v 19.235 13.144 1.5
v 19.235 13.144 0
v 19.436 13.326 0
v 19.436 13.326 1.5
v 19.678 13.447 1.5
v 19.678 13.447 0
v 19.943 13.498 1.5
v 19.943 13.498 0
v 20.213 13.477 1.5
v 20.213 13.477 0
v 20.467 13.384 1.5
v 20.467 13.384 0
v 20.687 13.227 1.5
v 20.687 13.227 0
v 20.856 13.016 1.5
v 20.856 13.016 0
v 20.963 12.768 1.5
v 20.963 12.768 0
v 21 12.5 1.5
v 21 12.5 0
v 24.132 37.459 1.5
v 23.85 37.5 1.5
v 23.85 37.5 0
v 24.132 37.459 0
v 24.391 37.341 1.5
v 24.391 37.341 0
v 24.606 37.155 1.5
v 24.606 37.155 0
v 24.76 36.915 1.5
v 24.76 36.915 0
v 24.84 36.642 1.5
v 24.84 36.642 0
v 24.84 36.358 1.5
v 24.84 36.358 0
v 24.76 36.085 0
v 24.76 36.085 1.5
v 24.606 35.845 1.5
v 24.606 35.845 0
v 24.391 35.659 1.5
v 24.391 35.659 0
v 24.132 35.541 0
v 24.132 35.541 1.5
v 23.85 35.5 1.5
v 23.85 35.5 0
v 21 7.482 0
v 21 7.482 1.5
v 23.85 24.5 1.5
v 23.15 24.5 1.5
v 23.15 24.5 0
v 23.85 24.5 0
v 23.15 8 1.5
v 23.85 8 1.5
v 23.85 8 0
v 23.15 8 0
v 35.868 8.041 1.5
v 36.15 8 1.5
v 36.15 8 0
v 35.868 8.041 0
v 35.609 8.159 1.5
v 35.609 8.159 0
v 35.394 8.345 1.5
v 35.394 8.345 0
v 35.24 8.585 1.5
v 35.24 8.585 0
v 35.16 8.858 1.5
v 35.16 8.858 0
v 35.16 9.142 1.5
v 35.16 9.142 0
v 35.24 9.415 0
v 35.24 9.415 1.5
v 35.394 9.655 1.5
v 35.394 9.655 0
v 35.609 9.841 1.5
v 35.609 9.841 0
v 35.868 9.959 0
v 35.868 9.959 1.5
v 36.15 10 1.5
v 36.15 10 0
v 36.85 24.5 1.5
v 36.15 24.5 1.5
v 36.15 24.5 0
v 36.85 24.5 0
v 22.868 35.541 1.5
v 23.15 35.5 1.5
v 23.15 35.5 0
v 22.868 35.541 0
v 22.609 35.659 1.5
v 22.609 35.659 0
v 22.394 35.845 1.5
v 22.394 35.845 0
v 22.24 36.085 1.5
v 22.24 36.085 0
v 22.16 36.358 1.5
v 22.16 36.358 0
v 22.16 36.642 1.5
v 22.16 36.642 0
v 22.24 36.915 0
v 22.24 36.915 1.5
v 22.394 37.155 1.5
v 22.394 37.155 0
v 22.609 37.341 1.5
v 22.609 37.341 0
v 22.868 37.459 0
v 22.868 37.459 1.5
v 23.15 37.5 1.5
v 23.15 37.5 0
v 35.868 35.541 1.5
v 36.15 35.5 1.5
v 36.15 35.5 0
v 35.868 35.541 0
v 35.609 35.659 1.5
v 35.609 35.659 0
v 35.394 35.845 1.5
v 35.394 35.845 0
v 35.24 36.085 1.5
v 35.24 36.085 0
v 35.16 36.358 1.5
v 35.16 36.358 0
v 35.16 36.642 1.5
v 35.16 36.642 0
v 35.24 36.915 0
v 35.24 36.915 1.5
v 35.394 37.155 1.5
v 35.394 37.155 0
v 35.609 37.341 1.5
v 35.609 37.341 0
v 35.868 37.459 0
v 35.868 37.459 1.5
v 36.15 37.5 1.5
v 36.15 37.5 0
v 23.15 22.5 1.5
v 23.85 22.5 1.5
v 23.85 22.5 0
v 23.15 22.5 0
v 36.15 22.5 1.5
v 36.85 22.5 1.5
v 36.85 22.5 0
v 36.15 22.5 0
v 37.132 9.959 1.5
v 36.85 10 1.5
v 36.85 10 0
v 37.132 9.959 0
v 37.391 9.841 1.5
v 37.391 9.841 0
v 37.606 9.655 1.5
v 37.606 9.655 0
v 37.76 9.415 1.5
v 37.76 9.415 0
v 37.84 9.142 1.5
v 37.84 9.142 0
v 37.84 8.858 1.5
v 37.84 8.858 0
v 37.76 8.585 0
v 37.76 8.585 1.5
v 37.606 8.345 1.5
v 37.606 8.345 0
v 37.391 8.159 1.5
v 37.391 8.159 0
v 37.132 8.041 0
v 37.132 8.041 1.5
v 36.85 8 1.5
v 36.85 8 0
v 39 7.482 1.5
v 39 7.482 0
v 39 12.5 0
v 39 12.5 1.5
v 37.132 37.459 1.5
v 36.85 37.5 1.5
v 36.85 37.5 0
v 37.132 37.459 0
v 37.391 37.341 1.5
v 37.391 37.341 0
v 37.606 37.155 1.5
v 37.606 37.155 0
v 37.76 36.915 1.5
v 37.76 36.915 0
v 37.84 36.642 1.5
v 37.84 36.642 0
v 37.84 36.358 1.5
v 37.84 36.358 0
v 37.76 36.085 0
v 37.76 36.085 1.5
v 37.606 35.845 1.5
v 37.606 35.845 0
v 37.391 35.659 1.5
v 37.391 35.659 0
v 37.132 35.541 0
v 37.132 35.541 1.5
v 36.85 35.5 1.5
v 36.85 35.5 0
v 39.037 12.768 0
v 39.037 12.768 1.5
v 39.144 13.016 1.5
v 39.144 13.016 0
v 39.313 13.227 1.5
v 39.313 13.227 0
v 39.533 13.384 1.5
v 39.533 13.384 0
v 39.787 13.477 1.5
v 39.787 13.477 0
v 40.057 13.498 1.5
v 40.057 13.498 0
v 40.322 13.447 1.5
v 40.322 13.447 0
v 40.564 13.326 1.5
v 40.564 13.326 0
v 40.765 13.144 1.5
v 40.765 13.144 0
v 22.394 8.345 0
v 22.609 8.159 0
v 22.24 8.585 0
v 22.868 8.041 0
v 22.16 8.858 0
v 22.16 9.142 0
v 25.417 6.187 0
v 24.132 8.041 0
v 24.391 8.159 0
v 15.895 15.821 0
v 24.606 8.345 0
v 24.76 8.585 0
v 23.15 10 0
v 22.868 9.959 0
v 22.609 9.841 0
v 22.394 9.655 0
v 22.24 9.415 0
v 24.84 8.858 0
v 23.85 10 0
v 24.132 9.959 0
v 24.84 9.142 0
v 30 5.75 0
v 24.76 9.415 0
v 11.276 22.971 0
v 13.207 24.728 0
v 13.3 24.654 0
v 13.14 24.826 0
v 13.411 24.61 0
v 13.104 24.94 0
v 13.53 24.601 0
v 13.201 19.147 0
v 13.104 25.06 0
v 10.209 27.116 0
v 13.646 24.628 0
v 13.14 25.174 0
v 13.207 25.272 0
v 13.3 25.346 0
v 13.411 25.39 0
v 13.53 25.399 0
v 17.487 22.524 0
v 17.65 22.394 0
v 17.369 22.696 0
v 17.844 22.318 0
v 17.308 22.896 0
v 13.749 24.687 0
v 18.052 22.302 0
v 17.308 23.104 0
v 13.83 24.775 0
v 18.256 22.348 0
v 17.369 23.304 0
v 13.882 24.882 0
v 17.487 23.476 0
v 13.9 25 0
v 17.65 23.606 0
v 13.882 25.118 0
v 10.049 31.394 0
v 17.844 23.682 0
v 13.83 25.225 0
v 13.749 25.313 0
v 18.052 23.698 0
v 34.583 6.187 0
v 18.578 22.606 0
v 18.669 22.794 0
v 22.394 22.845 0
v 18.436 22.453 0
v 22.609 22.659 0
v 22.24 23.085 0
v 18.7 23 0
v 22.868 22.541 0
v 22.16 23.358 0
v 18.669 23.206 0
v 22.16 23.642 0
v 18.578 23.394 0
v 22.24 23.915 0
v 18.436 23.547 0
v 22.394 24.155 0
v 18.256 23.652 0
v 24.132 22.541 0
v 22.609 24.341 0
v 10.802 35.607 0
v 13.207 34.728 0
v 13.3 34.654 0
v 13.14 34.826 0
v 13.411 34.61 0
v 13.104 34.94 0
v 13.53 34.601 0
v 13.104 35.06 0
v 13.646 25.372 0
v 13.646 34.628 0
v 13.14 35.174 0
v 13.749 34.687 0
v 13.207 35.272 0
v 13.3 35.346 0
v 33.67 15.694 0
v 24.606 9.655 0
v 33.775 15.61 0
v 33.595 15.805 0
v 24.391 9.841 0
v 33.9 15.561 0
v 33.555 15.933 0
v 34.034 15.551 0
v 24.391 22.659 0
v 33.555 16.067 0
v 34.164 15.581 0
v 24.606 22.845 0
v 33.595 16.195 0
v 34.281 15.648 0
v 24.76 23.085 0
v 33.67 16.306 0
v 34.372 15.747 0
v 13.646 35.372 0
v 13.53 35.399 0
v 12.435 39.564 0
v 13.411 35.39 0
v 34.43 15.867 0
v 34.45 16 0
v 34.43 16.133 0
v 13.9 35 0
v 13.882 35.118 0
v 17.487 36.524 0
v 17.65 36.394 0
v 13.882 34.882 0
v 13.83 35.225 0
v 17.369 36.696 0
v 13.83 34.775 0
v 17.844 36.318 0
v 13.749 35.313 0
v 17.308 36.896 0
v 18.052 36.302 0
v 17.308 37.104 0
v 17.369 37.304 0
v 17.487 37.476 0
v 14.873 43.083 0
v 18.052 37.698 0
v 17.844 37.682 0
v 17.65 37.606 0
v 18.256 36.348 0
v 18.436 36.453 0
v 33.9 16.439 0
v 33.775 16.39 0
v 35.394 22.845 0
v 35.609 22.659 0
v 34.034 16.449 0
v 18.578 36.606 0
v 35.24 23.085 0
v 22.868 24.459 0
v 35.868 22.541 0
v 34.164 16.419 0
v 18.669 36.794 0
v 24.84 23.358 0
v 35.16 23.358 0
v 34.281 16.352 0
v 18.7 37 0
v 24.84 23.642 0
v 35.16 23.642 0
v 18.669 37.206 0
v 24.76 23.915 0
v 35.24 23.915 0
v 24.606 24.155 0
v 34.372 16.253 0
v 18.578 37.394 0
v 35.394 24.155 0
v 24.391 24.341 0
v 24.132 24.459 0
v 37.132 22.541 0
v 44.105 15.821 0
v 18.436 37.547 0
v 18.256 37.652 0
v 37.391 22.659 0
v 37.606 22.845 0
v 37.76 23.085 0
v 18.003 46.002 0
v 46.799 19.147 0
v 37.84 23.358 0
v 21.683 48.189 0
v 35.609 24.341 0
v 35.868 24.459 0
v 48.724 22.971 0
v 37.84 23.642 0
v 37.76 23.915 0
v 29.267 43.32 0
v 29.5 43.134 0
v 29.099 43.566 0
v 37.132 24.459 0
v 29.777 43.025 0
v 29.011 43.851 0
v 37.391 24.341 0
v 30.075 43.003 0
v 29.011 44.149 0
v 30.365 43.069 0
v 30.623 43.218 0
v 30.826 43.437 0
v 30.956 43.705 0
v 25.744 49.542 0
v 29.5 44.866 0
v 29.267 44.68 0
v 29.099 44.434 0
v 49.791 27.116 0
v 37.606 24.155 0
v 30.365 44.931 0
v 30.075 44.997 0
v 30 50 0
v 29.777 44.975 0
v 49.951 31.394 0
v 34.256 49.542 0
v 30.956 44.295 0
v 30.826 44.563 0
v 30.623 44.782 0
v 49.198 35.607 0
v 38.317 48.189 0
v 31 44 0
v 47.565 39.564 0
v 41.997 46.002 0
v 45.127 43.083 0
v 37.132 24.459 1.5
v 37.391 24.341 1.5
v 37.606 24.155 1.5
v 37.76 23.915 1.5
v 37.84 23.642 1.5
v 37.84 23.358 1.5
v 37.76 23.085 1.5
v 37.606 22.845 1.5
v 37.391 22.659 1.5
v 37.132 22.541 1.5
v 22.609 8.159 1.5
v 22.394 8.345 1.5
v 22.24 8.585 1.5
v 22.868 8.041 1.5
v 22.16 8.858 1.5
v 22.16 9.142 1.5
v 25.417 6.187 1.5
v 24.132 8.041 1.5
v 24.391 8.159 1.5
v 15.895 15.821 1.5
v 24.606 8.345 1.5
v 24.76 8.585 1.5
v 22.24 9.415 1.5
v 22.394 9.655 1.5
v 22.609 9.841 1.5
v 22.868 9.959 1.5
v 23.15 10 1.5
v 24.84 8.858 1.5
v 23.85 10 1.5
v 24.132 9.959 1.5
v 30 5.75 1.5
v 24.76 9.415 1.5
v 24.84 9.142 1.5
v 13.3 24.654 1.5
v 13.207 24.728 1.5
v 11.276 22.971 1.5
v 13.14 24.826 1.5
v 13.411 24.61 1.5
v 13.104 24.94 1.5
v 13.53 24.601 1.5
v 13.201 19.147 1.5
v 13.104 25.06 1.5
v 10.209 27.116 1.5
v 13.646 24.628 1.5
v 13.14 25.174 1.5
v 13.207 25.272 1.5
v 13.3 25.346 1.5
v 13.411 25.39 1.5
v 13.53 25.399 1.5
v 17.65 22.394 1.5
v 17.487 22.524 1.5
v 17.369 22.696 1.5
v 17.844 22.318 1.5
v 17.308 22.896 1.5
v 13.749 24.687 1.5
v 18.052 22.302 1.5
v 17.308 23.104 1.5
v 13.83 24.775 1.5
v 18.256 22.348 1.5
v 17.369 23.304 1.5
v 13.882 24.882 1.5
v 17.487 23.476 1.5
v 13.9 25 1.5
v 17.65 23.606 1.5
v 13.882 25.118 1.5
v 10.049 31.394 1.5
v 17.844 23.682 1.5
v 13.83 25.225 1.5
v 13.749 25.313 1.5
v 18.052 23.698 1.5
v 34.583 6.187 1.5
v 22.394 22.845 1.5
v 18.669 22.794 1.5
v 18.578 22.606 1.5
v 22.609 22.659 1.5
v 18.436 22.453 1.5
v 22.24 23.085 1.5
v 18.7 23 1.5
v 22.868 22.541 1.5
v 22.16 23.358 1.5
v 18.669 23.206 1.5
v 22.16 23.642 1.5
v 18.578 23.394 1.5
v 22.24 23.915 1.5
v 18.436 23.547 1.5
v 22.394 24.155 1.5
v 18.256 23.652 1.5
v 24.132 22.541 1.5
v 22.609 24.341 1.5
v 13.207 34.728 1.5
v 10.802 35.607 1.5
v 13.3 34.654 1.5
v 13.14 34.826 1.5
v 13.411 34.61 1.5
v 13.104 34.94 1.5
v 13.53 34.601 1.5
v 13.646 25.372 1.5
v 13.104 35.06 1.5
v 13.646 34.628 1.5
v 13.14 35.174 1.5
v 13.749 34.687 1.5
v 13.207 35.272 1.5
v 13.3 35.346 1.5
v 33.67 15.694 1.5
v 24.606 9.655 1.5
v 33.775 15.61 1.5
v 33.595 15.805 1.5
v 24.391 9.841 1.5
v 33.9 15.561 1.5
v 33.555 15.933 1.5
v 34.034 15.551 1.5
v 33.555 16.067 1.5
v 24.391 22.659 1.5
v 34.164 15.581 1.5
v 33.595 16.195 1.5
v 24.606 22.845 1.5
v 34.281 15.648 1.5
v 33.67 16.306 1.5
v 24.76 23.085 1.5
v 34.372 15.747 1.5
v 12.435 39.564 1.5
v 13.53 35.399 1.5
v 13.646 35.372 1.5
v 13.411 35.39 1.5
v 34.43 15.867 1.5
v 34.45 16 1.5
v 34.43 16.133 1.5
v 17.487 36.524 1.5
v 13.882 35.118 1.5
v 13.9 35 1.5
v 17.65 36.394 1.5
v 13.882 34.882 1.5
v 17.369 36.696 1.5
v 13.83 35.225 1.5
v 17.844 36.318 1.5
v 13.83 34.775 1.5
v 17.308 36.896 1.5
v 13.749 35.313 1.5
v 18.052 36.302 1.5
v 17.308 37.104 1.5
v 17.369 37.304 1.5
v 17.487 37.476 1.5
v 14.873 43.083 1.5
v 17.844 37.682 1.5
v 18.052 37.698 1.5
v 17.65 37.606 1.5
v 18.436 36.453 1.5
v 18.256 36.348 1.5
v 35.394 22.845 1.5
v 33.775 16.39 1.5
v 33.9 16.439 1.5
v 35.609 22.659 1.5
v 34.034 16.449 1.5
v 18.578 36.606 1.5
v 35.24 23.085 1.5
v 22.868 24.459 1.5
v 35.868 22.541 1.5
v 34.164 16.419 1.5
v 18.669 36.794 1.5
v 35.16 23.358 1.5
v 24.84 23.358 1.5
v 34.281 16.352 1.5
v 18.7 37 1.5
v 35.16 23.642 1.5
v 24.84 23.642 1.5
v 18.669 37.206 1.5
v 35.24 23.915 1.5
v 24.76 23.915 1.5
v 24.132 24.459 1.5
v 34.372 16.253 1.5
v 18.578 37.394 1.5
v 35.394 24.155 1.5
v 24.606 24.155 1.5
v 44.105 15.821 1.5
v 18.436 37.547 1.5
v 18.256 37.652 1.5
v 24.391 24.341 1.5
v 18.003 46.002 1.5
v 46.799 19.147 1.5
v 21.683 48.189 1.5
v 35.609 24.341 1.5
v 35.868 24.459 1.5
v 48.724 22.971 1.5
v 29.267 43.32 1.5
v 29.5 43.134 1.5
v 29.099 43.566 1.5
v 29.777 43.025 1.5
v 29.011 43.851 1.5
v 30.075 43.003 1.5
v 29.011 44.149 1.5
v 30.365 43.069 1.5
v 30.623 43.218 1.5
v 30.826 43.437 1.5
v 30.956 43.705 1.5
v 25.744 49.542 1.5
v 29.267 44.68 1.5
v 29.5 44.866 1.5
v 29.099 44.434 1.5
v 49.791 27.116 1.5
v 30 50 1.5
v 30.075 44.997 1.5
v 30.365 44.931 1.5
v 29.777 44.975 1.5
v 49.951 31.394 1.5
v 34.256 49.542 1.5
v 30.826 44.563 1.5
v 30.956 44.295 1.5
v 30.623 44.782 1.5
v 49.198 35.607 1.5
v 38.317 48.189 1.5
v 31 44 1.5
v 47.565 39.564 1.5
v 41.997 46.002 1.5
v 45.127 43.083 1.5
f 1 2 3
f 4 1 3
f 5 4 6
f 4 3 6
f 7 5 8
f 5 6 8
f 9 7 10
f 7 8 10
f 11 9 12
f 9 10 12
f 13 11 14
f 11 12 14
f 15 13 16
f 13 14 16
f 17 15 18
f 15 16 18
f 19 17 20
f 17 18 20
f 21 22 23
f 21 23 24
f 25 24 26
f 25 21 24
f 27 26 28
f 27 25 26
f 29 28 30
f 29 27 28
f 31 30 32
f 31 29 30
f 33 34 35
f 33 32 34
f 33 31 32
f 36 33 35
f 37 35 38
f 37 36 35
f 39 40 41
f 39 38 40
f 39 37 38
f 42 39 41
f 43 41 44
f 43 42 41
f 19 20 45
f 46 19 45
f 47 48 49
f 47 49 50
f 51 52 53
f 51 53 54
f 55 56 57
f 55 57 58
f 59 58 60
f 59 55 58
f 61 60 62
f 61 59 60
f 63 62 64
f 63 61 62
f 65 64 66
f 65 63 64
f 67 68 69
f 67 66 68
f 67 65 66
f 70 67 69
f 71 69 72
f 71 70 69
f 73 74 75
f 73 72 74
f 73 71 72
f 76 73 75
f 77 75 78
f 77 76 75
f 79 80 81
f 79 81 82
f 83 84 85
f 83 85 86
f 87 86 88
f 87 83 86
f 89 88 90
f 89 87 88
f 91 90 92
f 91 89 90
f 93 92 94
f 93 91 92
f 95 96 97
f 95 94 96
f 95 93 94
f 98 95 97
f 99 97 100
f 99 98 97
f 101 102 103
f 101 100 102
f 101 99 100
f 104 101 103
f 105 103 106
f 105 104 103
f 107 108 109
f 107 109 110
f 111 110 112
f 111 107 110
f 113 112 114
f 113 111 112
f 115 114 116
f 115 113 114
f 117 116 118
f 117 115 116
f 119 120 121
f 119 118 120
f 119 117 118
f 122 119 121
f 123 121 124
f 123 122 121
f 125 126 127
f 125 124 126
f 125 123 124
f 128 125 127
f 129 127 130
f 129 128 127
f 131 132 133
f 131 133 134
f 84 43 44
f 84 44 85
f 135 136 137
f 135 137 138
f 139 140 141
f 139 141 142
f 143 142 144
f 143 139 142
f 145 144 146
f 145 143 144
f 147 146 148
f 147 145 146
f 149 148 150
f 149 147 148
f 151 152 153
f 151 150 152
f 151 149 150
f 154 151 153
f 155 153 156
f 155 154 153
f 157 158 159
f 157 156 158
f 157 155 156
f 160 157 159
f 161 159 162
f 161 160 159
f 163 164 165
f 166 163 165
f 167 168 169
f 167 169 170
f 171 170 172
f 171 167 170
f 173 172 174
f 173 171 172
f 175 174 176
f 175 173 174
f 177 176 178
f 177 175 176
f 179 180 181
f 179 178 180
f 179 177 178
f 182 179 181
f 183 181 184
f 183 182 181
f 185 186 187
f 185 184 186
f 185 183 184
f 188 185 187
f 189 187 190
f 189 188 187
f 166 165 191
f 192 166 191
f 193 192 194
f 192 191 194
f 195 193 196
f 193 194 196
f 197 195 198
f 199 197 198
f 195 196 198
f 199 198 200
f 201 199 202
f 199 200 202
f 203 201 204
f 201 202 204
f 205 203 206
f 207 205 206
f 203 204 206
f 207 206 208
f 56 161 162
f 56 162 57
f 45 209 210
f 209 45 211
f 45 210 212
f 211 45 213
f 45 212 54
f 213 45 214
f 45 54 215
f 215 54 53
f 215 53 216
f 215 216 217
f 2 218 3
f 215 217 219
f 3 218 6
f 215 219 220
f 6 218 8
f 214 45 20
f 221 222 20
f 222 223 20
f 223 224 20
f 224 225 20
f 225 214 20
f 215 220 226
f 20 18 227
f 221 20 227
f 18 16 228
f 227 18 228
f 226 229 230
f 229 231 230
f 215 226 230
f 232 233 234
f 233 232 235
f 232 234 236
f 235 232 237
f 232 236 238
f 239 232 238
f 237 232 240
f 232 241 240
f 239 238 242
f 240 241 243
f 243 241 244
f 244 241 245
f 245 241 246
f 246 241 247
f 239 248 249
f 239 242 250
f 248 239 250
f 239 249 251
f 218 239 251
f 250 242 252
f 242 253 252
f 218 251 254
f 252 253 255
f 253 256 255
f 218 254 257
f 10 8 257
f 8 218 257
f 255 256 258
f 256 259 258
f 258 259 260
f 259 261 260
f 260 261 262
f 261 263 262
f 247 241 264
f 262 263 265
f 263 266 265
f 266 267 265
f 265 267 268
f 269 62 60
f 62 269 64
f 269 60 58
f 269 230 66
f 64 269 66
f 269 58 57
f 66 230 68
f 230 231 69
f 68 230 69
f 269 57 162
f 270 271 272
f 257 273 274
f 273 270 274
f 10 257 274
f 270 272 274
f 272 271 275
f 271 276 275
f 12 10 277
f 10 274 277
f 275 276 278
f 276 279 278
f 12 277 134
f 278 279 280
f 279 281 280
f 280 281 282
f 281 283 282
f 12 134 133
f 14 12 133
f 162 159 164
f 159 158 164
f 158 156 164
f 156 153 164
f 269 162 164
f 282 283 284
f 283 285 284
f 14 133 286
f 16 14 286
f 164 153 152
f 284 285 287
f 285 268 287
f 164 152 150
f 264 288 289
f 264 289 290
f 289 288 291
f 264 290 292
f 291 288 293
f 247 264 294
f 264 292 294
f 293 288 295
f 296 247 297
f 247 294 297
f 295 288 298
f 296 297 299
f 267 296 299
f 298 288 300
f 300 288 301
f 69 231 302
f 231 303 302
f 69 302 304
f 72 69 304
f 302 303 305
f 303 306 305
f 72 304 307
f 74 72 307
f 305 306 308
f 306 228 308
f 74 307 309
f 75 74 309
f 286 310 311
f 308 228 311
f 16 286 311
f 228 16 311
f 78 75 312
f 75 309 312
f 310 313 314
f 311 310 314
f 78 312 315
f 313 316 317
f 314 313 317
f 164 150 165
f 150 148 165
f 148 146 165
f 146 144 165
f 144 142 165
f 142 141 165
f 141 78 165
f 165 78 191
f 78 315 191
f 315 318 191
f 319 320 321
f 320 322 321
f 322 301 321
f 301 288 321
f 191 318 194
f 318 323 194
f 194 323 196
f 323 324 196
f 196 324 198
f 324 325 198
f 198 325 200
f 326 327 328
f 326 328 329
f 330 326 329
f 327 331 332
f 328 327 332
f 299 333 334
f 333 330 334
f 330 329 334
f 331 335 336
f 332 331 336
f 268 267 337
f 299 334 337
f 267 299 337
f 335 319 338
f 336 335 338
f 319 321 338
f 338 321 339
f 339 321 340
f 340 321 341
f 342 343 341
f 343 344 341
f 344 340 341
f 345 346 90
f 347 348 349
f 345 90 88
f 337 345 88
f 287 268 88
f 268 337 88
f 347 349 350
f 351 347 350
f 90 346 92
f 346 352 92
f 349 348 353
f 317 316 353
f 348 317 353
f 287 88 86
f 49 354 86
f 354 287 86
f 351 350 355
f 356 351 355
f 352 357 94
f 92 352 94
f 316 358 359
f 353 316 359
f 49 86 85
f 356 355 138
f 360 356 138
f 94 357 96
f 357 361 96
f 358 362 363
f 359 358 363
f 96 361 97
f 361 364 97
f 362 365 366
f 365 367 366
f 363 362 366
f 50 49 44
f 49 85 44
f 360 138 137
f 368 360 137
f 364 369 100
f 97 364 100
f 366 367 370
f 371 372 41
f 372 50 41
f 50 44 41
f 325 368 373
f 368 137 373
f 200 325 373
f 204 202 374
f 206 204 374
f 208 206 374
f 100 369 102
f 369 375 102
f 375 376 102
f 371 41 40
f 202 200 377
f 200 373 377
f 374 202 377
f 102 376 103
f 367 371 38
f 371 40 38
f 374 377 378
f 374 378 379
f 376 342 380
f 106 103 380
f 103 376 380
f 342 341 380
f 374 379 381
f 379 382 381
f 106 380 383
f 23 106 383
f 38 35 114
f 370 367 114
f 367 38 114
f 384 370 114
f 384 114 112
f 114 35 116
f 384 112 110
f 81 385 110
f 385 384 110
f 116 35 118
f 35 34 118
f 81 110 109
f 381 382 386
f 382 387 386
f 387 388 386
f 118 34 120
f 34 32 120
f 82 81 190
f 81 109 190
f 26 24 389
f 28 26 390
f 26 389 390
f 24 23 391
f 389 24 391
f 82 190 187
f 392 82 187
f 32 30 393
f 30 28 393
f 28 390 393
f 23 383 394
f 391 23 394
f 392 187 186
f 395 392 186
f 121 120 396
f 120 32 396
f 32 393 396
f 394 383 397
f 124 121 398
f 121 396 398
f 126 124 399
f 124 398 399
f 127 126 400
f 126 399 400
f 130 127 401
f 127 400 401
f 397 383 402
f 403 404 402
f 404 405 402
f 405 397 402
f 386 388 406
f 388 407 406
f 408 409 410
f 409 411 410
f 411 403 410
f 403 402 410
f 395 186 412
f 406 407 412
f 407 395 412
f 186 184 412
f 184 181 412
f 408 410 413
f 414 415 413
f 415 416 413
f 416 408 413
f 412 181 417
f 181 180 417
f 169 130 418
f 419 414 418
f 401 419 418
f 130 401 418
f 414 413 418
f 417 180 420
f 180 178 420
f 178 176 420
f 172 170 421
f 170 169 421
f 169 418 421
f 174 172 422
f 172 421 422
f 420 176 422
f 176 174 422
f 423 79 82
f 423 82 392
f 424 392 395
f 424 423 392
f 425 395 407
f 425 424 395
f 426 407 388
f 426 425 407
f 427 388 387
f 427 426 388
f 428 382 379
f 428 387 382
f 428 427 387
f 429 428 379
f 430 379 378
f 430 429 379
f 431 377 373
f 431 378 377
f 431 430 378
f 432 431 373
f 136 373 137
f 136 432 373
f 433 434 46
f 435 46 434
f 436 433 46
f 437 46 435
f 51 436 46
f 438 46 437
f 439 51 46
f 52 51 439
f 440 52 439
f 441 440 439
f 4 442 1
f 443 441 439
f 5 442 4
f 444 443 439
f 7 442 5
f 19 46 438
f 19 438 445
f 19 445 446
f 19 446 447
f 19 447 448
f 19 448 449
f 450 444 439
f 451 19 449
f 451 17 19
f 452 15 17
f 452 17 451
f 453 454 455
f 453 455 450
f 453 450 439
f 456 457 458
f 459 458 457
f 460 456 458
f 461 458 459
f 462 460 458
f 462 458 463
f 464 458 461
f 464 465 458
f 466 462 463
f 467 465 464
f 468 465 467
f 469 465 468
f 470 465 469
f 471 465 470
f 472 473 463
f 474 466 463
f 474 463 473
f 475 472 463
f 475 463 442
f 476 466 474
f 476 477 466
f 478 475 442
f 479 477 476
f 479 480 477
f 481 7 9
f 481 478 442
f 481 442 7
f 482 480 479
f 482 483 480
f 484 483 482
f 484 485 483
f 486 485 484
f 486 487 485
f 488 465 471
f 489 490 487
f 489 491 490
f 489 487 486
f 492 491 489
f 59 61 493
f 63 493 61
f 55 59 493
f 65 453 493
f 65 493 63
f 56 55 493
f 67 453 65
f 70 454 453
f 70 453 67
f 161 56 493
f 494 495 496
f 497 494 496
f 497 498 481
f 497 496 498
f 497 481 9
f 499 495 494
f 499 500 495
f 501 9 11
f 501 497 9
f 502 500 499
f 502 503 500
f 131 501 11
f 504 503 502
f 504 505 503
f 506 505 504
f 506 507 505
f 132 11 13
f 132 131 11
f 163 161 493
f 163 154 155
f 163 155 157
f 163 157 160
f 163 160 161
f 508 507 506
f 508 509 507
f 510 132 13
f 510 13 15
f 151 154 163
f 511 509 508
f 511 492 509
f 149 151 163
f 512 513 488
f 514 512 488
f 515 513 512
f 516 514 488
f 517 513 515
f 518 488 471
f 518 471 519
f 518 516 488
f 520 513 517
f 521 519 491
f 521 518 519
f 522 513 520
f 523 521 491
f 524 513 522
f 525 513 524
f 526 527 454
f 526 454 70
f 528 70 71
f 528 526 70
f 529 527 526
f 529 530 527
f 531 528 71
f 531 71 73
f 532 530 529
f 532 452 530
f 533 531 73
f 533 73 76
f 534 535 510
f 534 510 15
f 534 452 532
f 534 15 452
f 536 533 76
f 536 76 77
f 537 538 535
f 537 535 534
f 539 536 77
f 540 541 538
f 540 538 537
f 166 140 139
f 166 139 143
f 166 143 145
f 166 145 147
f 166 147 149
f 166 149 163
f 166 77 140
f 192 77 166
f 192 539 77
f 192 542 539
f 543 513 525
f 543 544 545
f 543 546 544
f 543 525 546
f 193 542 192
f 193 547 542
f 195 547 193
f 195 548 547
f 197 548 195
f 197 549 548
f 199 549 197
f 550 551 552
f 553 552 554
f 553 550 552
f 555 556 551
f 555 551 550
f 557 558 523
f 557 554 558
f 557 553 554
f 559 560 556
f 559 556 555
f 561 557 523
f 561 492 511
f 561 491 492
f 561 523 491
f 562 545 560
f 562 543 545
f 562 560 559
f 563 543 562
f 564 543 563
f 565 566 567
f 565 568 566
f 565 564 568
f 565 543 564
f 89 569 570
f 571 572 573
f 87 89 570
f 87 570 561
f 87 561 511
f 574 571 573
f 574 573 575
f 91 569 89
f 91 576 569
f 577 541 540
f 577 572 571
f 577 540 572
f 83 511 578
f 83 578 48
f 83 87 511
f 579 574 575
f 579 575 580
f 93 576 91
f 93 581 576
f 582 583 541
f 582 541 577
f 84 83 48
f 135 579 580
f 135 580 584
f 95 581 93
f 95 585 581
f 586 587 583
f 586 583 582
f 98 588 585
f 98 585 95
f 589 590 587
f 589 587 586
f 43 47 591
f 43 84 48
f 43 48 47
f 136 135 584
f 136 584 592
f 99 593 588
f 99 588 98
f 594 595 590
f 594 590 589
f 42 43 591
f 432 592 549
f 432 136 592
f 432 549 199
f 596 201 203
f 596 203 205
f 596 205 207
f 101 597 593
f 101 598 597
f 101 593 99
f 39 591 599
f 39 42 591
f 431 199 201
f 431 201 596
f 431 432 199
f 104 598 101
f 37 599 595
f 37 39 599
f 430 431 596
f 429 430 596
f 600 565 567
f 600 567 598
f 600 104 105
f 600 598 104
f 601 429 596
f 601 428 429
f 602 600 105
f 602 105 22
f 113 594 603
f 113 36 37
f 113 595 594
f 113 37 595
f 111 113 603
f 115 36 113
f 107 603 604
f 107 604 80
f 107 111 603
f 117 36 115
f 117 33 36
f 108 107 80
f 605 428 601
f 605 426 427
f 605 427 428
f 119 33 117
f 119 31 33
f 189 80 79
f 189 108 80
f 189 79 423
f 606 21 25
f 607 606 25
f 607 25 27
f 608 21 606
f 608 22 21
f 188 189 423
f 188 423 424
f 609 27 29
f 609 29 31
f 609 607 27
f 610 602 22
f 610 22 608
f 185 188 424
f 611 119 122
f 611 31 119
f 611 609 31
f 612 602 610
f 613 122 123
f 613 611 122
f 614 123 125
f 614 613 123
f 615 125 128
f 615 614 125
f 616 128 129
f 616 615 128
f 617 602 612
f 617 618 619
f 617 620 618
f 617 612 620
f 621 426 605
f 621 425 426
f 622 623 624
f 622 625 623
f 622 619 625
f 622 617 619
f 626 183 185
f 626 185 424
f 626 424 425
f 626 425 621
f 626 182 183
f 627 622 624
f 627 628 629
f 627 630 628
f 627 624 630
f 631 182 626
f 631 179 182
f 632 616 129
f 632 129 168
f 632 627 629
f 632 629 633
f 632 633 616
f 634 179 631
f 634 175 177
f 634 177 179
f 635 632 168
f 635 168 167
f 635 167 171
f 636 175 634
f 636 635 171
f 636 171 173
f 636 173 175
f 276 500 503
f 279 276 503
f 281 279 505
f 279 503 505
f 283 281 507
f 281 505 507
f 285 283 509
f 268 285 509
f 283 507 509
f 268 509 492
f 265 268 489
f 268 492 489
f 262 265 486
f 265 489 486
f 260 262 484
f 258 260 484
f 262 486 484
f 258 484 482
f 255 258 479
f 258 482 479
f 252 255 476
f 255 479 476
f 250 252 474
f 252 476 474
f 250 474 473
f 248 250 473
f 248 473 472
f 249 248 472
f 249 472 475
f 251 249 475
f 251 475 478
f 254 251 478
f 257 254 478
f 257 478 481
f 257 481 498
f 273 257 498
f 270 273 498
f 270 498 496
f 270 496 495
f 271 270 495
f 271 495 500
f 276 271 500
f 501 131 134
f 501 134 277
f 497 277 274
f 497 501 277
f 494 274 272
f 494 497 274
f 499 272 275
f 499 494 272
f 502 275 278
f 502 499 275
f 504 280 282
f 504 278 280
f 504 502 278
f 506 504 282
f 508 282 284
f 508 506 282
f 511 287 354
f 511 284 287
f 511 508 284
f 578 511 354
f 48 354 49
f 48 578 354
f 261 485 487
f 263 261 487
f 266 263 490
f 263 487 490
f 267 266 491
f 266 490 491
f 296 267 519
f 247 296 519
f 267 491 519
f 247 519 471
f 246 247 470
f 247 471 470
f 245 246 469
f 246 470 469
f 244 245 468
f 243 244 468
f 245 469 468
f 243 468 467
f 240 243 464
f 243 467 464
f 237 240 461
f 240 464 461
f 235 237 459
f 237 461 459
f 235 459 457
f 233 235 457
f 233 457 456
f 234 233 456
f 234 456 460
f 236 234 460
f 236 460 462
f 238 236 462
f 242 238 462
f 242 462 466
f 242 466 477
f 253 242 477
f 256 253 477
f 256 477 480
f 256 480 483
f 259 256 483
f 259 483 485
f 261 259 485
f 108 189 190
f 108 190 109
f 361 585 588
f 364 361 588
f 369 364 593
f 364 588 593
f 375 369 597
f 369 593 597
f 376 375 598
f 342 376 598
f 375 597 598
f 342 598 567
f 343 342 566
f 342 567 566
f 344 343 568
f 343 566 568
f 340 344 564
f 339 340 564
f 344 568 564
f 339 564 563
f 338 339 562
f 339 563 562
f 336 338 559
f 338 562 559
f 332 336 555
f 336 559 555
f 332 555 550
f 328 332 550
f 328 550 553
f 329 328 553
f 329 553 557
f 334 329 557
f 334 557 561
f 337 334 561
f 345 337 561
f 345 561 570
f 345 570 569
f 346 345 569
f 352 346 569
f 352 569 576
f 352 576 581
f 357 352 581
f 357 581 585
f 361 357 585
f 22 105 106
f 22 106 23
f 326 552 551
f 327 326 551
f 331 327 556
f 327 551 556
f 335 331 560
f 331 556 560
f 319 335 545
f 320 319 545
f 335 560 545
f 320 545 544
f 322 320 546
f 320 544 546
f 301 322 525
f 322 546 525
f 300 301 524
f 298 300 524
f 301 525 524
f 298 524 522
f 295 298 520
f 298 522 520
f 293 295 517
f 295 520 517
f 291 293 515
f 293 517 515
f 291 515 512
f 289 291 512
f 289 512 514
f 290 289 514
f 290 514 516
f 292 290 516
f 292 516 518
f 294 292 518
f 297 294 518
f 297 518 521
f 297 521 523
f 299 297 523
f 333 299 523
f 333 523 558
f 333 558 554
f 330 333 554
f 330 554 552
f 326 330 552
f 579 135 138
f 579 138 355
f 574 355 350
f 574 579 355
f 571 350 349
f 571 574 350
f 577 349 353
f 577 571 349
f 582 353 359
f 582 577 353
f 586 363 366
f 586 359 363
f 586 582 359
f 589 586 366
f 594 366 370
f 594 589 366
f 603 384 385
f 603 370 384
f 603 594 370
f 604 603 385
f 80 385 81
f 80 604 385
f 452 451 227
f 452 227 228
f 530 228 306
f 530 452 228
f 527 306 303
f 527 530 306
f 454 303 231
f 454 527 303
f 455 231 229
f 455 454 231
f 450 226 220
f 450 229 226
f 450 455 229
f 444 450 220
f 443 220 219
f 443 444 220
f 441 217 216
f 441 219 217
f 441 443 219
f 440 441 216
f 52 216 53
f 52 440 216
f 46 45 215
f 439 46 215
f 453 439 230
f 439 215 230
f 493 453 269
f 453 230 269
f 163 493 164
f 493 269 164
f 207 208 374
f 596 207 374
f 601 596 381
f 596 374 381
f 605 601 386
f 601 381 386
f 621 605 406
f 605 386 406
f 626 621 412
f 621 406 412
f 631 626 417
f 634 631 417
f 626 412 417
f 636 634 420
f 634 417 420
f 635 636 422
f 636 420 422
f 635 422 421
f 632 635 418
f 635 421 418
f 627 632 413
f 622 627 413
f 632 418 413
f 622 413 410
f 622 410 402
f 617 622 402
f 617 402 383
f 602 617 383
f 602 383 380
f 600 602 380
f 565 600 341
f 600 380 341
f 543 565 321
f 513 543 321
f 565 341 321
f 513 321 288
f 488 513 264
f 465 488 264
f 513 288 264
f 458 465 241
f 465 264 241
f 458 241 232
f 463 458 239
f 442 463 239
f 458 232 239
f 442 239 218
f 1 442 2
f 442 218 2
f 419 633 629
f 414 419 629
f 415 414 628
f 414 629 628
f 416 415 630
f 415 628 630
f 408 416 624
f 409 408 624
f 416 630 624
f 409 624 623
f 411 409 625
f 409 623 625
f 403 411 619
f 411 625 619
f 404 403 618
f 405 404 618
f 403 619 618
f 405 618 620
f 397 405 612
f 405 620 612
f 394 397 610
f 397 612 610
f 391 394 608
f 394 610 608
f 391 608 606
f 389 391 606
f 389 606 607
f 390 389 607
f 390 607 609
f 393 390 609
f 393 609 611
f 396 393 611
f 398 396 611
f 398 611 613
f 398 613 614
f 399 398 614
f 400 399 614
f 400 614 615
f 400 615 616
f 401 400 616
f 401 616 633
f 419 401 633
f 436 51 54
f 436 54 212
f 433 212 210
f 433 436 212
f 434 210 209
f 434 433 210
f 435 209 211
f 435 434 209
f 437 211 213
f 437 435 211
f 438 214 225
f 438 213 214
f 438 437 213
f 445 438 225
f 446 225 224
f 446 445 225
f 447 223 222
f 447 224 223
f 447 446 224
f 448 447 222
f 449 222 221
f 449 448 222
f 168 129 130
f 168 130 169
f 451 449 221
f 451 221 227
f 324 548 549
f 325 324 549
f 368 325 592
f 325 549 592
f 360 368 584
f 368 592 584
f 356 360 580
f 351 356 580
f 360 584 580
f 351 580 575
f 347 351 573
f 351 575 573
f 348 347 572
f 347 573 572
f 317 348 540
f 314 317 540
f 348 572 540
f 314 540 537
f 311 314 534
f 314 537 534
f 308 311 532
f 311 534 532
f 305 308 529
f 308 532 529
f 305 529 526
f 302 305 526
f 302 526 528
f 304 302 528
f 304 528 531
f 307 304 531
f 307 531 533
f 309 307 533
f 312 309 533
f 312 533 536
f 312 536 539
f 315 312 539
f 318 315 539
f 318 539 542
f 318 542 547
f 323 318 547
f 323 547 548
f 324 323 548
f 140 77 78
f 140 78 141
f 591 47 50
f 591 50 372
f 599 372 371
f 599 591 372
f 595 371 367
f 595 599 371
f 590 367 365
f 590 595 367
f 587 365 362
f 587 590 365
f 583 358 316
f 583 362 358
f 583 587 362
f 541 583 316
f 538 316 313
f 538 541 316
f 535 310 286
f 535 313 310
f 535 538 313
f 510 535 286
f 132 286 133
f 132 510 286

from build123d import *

# Parameters (mm, degrees)
EXTRUDE_1_DEPTH     = 1.5
SKETCH_2_R          = 0.45
SKETCH_2_R_2        = 1
SKETCH_2_R_3        = 0.4
SKETCH_2_R_4        = 0.7
CUT_EXTRUDE_1_DEPTH = 2.5


with BuildPart() as part:
    # Эскиз1 → Бобышка-Вытянуть1 (new body)
    with BuildSketch(Plane.XY):
        with BuildLine():
            Line((21, 12.5), (21, 7.481951683))
            ThreePointArc((21, 7.481951683), (30, 5.75), (39, 7.481951683))
            Line((39, 7.481951683), (39, 12.5))
            ThreePointArc((39, 12.5), (39.657111376, 13.439376065), (40.764854783, 13.144202733))
            ThreePointArc((40.764854783, 13.144202733), (30, 50), (19.235145217, 13.144202733))
            ThreePointArc((19.235145217, 13.144202733), (20.342888624, 13.439376065), (21, 12.5))
        make_face()
    extrude(amount=EXTRUDE_1_DEPTH)

    # Эскиз2 → Вырез-Вытянуть1 (cut, through all)
    with BuildSketch(Plane.XY.offset(1.5)):
        with Locations((34, 16)):
            Circle(SKETCH_2_R)
        with Locations((30, 44)):
            Circle(SKETCH_2_R_2)
        with Locations((13.5, 35)):
            Circle(SKETCH_2_R_3)
        with Locations((13.5, 25)):
            Circle(SKETCH_2_R_3)
        with Locations((18, 37)):
            Circle(SKETCH_2_R_4)
        with Locations((18, 23)):
            Circle(SKETCH_2_R_4)
        with BuildLine():
            Line((23.85, 35.5), (23.15, 35.5))
            ThreePointArc((23.15, 35.5), (22.15, 36.5), (23.15, 37.5))
            Line((23.15, 37.5), (23.85, 37.5))
            ThreePointArc((23.85, 37.5), (24.85, 36.5), (23.85, 35.5))
        make_face()
        with BuildLine():
            Line((36.85, 35.5), (36.15, 35.5))
            ThreePointArc((36.15, 35.5), (35.15, 36.5), (36.15, 37.5))
            Line((36.15, 37.5), (36.85, 37.5))
            ThreePointArc((36.85, 37.5), (37.85, 36.5), (36.85, 35.5))
        make_face()
        with BuildLine():
            Line((23.85, 22.5), (23.15, 22.5))
            ThreePointArc((23.15, 22.5), (22.15, 23.5), (23.15, 24.5))
            Line((23.15, 24.5), (23.85, 24.5))
            ThreePointArc((23.85, 24.5), (24.85, 23.5), (23.85, 22.5))
        make_face()
        with BuildLine():
            Line((36.85, 22.5), (36.15, 22.5))
            ThreePointArc((36.15, 22.5), (35.15, 23.5), (36.15, 24.5))
            Line((36.15, 24.5), (36.85, 24.5))
            ThreePointArc((36.85, 24.5), (37.85, 23.5), (36.85, 22.5))
        make_face()
        with BuildLine():
            Line((23.85, 8), (23.15, 8))
            ThreePointArc((23.15, 8), (22.15, 9), (23.15, 10))
            Line((23.15, 10), (23.85, 10))
            ThreePointArc((23.85, 10), (24.85, 9), (23.85, 8))
        make_face()
        with BuildLine():
            Line((36.85, 8), (36.15, 8))
            ThreePointArc((36.15, 8), (35.15, 9), (36.15, 10))
            Line((36.15, 10), (36.85, 10))
            ThreePointArc((36.85, 10), (37.85, 9), (36.85, 8))
        make_face()
    extrude(amount=-CUT_EXTRUDE_1_DEPTH, mode=Mode.SUBTRACT)


solid = part.part
